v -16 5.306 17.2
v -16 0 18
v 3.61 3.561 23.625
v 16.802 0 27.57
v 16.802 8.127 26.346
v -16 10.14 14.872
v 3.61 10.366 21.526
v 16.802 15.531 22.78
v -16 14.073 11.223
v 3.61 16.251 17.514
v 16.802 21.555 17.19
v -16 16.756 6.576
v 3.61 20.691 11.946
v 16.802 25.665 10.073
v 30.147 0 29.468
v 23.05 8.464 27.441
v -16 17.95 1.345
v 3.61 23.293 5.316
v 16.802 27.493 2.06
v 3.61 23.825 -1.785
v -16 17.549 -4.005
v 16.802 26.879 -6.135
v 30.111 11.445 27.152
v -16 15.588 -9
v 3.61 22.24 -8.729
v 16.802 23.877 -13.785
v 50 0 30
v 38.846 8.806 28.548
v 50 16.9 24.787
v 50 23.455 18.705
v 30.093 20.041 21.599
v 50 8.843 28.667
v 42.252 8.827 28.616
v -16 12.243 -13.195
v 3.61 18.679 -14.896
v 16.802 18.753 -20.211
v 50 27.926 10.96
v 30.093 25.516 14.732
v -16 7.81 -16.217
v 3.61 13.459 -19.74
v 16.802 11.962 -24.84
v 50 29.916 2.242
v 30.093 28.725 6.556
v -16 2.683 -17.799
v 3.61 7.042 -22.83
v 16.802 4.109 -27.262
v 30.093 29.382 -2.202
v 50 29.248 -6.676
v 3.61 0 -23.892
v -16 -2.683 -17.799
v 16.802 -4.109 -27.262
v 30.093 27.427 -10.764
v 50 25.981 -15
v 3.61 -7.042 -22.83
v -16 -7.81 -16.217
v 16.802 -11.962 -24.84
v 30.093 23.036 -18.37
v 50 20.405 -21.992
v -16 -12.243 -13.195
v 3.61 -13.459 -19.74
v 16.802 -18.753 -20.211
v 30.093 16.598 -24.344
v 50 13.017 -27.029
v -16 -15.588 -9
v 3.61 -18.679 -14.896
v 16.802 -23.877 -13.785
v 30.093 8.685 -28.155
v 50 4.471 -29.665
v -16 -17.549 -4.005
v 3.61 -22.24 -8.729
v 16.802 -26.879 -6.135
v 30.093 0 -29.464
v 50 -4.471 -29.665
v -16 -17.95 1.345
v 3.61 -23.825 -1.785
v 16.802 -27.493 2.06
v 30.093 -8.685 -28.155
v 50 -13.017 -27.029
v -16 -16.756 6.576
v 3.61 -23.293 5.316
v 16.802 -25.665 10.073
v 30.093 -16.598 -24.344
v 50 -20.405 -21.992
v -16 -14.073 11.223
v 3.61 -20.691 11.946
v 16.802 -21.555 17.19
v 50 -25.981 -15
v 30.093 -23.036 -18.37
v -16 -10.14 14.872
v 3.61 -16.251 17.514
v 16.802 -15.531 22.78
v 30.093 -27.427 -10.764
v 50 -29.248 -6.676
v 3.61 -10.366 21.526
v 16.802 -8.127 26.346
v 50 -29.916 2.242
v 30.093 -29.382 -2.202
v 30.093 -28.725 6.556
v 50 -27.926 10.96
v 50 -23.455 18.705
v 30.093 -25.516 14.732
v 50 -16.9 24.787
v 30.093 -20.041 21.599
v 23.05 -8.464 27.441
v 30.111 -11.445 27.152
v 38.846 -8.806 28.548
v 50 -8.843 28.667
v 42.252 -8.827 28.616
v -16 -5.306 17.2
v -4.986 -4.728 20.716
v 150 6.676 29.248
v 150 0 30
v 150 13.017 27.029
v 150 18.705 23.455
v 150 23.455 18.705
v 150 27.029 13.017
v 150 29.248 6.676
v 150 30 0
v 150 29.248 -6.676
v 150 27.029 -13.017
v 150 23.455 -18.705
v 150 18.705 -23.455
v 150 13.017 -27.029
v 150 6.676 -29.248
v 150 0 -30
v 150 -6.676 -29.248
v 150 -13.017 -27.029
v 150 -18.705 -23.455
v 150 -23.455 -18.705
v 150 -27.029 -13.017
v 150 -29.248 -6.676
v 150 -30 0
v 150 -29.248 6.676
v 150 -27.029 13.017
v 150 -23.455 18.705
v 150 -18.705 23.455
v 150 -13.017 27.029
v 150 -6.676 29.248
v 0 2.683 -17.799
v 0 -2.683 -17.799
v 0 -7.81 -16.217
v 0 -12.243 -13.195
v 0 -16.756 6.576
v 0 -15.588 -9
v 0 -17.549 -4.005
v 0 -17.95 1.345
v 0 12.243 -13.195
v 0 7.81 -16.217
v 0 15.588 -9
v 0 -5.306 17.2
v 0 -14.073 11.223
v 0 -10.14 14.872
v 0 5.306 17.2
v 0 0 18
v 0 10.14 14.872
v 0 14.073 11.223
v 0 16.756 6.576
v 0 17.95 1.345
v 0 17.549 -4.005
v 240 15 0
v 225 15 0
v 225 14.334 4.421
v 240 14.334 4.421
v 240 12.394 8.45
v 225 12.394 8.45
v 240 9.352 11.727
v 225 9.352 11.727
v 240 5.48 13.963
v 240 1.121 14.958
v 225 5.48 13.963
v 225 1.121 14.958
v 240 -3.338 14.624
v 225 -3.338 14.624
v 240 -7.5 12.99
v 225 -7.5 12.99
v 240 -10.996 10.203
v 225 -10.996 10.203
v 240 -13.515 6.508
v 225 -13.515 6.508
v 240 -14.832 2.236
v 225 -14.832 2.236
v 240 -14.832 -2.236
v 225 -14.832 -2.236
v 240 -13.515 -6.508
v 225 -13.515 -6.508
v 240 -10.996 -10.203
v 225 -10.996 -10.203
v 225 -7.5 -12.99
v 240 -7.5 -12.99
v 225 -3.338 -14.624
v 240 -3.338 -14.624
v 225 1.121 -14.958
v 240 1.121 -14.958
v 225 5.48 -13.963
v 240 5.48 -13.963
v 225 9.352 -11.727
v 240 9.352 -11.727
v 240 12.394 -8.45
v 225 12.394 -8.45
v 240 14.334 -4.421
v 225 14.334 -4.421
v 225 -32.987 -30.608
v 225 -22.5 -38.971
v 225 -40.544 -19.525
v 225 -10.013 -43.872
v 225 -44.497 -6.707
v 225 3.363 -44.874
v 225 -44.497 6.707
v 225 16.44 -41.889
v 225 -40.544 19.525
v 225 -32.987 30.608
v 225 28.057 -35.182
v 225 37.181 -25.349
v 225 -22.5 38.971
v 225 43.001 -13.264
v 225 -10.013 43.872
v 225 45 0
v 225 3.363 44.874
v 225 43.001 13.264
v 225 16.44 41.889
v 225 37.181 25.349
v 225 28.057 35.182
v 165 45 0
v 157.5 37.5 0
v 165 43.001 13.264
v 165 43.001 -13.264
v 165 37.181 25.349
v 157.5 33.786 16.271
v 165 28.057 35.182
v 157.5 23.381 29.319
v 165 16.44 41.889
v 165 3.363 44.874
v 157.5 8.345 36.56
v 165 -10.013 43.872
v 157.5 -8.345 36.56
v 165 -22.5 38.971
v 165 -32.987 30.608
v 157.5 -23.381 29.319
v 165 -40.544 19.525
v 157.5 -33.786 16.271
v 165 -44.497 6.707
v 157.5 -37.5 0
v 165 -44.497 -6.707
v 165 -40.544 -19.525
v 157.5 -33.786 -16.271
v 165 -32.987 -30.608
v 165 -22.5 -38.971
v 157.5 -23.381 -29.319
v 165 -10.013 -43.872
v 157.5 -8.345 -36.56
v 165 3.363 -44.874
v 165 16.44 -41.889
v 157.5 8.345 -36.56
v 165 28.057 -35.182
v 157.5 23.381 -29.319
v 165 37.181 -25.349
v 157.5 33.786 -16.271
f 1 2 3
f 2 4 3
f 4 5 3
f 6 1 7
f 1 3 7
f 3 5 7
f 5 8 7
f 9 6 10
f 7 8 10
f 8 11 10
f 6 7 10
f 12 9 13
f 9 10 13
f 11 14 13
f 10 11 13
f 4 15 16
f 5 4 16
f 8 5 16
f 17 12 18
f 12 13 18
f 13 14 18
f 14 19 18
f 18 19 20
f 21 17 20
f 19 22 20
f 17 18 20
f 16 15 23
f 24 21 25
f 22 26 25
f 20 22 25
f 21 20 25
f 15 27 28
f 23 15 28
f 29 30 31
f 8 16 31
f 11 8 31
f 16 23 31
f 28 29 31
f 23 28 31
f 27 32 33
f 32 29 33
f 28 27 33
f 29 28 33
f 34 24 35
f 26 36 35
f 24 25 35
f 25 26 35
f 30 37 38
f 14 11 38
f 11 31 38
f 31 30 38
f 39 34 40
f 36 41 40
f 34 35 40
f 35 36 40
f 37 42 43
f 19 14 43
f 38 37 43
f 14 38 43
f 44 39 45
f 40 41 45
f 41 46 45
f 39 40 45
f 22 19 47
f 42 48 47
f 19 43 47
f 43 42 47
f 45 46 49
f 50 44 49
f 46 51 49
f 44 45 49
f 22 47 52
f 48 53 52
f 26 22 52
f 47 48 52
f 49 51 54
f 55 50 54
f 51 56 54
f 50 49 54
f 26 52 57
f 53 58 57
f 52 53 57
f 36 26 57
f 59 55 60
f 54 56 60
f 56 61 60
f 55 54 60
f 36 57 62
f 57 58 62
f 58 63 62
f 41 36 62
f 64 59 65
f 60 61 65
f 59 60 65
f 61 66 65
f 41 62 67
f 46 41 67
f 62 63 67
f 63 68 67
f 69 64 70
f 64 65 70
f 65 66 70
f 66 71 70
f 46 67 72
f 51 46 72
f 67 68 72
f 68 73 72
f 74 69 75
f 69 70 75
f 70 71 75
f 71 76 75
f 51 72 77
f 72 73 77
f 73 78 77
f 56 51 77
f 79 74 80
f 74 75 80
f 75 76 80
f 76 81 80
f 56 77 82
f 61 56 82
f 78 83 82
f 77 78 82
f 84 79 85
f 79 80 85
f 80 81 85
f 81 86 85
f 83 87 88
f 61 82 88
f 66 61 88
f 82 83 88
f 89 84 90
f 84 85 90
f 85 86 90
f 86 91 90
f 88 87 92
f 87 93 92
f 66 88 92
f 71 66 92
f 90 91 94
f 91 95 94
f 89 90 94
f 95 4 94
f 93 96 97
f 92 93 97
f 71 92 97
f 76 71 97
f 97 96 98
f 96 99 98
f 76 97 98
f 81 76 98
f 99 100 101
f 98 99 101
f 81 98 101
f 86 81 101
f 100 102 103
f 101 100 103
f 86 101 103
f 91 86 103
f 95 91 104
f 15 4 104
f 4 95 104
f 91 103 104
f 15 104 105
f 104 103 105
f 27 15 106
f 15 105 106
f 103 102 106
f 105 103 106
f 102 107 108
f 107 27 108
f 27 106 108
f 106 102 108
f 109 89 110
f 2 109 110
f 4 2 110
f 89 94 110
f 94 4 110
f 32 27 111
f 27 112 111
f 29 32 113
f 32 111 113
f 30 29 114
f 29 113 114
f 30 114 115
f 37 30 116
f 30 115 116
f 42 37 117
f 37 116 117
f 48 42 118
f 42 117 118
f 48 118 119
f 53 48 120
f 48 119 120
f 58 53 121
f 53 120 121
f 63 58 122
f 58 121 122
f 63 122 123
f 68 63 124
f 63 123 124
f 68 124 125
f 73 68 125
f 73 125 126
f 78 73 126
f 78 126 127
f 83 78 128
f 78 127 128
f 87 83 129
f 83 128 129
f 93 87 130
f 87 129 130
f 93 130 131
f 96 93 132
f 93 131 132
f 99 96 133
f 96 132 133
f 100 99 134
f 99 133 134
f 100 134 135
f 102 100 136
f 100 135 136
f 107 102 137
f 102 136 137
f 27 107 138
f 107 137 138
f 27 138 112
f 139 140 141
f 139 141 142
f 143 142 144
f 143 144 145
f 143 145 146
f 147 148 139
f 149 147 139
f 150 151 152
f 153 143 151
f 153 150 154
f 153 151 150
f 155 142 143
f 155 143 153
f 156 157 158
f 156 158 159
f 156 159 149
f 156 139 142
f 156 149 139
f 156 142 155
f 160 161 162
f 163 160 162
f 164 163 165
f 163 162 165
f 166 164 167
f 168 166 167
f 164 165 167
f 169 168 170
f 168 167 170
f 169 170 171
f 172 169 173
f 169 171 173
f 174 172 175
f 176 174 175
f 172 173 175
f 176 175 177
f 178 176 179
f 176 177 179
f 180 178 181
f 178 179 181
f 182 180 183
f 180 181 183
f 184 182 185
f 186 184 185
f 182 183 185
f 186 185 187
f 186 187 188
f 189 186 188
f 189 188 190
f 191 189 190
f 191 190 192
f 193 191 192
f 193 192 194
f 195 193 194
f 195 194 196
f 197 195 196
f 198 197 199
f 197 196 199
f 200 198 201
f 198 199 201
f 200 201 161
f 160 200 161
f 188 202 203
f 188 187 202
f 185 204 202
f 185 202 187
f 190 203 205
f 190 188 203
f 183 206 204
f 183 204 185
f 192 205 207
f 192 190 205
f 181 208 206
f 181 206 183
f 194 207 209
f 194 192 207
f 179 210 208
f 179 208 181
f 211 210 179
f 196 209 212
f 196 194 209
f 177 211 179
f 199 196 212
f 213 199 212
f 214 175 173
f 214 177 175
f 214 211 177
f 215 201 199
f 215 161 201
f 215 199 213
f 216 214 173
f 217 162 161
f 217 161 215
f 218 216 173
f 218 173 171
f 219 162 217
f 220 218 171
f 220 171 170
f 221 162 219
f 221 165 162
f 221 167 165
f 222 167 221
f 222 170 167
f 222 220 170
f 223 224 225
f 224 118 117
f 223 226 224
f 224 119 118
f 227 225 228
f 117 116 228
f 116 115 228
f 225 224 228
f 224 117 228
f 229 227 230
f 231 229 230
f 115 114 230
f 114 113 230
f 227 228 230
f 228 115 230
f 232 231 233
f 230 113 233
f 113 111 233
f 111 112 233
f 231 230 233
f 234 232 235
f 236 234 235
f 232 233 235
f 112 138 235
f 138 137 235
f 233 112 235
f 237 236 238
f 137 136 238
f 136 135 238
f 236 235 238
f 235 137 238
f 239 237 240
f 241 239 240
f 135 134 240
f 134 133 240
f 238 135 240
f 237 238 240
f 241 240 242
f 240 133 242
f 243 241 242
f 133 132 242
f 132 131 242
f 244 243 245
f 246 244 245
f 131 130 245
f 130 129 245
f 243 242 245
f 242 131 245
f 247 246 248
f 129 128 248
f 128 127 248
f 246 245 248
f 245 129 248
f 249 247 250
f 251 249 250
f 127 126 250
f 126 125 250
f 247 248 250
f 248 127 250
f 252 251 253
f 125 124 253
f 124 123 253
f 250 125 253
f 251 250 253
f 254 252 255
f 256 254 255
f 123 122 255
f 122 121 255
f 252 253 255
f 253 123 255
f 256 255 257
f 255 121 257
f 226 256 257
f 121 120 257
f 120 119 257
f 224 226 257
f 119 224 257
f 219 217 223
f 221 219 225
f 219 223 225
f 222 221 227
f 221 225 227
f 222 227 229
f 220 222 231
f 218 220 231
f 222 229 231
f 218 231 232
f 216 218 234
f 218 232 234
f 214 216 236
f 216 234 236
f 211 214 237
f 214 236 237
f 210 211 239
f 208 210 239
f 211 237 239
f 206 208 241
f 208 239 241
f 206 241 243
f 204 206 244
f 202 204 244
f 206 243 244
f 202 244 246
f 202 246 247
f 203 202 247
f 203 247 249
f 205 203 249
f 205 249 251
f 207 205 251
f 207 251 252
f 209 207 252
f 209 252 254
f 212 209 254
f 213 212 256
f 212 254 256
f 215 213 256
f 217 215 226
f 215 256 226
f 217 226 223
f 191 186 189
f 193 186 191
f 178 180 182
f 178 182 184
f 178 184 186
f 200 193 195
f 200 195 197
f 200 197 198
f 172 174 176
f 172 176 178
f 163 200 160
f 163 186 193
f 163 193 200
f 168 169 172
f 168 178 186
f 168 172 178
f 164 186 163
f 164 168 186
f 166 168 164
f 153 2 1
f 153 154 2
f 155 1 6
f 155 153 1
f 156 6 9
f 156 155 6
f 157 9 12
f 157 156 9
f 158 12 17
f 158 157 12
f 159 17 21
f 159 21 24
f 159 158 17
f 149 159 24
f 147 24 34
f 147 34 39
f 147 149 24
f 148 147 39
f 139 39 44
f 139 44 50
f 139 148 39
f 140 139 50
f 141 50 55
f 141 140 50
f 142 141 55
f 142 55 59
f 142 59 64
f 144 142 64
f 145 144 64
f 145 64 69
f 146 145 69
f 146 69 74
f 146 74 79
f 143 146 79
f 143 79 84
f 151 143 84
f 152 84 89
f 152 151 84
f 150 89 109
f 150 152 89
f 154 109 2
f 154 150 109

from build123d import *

# Parameters (mm, degrees)
F0_W     = 100
F0_H     = 30
F3_R     = 45
F3_R_2   = 30
F4_DEPTH = 75
F5_SIZE  = 14.99999
F7_R     = 15
F8_DEPTH = 15


# Not quite as in the source:
# - a fillet or chamfer is up to 0.001 mm smaller than in the source, because OpenCascade refuses the exact size


with BuildPart() as f1:
    # F0 (on Front) → F1 (revolve)
    with BuildSketch(Plane.XZ):
        with BuildLine():
            Line((0, 18), (0, 0))
            Line((0, 0), (50, 0))
            Line((50, 0), (50, 30))
            add(Edge.make_bspline(
                [(-16, 18), (17.3213258386, 27.5211501867), (16.1499090196, 30), (50, 30)],
                knots=[0, 0, 0, 0, 67.082039325, 67.082039325, 67.082039325, 67.082039325], degree=3))
            Line((-16, 18), (0, 18))
        make_face()
        with Locations((100, 15)):
            Rectangle(F0_W, F0_H)
    revolve(axis=Axis((25, 0, 0), (-1, 0, 0)))

    # F3 (on offset) → F4 (join)
    with BuildSketch(Plane.YZ.offset(150)):
        Circle(F3_R)
        Circle(F3_R_2, mode=Mode.SUBTRACT)
        Circle(F3_R_2)
    extrude(amount=F4_DEPTH)

    # F5 (size 15 in the source; OpenCascade refuses exactly that, so slightly less here)
    f5_edges = [f1.edges().sort_by_distance(p)[0] for p in [
        (150, -45, 0),
    ]]
    chamfer(f5_edges, length=F5_SIZE)

    # F7 (on offset) → F8 (join)
    with BuildSketch(Plane.YZ.offset(225)):
        Circle(F7_R)
    extrude(amount=F8_DEPTH)


solid = f1.part
